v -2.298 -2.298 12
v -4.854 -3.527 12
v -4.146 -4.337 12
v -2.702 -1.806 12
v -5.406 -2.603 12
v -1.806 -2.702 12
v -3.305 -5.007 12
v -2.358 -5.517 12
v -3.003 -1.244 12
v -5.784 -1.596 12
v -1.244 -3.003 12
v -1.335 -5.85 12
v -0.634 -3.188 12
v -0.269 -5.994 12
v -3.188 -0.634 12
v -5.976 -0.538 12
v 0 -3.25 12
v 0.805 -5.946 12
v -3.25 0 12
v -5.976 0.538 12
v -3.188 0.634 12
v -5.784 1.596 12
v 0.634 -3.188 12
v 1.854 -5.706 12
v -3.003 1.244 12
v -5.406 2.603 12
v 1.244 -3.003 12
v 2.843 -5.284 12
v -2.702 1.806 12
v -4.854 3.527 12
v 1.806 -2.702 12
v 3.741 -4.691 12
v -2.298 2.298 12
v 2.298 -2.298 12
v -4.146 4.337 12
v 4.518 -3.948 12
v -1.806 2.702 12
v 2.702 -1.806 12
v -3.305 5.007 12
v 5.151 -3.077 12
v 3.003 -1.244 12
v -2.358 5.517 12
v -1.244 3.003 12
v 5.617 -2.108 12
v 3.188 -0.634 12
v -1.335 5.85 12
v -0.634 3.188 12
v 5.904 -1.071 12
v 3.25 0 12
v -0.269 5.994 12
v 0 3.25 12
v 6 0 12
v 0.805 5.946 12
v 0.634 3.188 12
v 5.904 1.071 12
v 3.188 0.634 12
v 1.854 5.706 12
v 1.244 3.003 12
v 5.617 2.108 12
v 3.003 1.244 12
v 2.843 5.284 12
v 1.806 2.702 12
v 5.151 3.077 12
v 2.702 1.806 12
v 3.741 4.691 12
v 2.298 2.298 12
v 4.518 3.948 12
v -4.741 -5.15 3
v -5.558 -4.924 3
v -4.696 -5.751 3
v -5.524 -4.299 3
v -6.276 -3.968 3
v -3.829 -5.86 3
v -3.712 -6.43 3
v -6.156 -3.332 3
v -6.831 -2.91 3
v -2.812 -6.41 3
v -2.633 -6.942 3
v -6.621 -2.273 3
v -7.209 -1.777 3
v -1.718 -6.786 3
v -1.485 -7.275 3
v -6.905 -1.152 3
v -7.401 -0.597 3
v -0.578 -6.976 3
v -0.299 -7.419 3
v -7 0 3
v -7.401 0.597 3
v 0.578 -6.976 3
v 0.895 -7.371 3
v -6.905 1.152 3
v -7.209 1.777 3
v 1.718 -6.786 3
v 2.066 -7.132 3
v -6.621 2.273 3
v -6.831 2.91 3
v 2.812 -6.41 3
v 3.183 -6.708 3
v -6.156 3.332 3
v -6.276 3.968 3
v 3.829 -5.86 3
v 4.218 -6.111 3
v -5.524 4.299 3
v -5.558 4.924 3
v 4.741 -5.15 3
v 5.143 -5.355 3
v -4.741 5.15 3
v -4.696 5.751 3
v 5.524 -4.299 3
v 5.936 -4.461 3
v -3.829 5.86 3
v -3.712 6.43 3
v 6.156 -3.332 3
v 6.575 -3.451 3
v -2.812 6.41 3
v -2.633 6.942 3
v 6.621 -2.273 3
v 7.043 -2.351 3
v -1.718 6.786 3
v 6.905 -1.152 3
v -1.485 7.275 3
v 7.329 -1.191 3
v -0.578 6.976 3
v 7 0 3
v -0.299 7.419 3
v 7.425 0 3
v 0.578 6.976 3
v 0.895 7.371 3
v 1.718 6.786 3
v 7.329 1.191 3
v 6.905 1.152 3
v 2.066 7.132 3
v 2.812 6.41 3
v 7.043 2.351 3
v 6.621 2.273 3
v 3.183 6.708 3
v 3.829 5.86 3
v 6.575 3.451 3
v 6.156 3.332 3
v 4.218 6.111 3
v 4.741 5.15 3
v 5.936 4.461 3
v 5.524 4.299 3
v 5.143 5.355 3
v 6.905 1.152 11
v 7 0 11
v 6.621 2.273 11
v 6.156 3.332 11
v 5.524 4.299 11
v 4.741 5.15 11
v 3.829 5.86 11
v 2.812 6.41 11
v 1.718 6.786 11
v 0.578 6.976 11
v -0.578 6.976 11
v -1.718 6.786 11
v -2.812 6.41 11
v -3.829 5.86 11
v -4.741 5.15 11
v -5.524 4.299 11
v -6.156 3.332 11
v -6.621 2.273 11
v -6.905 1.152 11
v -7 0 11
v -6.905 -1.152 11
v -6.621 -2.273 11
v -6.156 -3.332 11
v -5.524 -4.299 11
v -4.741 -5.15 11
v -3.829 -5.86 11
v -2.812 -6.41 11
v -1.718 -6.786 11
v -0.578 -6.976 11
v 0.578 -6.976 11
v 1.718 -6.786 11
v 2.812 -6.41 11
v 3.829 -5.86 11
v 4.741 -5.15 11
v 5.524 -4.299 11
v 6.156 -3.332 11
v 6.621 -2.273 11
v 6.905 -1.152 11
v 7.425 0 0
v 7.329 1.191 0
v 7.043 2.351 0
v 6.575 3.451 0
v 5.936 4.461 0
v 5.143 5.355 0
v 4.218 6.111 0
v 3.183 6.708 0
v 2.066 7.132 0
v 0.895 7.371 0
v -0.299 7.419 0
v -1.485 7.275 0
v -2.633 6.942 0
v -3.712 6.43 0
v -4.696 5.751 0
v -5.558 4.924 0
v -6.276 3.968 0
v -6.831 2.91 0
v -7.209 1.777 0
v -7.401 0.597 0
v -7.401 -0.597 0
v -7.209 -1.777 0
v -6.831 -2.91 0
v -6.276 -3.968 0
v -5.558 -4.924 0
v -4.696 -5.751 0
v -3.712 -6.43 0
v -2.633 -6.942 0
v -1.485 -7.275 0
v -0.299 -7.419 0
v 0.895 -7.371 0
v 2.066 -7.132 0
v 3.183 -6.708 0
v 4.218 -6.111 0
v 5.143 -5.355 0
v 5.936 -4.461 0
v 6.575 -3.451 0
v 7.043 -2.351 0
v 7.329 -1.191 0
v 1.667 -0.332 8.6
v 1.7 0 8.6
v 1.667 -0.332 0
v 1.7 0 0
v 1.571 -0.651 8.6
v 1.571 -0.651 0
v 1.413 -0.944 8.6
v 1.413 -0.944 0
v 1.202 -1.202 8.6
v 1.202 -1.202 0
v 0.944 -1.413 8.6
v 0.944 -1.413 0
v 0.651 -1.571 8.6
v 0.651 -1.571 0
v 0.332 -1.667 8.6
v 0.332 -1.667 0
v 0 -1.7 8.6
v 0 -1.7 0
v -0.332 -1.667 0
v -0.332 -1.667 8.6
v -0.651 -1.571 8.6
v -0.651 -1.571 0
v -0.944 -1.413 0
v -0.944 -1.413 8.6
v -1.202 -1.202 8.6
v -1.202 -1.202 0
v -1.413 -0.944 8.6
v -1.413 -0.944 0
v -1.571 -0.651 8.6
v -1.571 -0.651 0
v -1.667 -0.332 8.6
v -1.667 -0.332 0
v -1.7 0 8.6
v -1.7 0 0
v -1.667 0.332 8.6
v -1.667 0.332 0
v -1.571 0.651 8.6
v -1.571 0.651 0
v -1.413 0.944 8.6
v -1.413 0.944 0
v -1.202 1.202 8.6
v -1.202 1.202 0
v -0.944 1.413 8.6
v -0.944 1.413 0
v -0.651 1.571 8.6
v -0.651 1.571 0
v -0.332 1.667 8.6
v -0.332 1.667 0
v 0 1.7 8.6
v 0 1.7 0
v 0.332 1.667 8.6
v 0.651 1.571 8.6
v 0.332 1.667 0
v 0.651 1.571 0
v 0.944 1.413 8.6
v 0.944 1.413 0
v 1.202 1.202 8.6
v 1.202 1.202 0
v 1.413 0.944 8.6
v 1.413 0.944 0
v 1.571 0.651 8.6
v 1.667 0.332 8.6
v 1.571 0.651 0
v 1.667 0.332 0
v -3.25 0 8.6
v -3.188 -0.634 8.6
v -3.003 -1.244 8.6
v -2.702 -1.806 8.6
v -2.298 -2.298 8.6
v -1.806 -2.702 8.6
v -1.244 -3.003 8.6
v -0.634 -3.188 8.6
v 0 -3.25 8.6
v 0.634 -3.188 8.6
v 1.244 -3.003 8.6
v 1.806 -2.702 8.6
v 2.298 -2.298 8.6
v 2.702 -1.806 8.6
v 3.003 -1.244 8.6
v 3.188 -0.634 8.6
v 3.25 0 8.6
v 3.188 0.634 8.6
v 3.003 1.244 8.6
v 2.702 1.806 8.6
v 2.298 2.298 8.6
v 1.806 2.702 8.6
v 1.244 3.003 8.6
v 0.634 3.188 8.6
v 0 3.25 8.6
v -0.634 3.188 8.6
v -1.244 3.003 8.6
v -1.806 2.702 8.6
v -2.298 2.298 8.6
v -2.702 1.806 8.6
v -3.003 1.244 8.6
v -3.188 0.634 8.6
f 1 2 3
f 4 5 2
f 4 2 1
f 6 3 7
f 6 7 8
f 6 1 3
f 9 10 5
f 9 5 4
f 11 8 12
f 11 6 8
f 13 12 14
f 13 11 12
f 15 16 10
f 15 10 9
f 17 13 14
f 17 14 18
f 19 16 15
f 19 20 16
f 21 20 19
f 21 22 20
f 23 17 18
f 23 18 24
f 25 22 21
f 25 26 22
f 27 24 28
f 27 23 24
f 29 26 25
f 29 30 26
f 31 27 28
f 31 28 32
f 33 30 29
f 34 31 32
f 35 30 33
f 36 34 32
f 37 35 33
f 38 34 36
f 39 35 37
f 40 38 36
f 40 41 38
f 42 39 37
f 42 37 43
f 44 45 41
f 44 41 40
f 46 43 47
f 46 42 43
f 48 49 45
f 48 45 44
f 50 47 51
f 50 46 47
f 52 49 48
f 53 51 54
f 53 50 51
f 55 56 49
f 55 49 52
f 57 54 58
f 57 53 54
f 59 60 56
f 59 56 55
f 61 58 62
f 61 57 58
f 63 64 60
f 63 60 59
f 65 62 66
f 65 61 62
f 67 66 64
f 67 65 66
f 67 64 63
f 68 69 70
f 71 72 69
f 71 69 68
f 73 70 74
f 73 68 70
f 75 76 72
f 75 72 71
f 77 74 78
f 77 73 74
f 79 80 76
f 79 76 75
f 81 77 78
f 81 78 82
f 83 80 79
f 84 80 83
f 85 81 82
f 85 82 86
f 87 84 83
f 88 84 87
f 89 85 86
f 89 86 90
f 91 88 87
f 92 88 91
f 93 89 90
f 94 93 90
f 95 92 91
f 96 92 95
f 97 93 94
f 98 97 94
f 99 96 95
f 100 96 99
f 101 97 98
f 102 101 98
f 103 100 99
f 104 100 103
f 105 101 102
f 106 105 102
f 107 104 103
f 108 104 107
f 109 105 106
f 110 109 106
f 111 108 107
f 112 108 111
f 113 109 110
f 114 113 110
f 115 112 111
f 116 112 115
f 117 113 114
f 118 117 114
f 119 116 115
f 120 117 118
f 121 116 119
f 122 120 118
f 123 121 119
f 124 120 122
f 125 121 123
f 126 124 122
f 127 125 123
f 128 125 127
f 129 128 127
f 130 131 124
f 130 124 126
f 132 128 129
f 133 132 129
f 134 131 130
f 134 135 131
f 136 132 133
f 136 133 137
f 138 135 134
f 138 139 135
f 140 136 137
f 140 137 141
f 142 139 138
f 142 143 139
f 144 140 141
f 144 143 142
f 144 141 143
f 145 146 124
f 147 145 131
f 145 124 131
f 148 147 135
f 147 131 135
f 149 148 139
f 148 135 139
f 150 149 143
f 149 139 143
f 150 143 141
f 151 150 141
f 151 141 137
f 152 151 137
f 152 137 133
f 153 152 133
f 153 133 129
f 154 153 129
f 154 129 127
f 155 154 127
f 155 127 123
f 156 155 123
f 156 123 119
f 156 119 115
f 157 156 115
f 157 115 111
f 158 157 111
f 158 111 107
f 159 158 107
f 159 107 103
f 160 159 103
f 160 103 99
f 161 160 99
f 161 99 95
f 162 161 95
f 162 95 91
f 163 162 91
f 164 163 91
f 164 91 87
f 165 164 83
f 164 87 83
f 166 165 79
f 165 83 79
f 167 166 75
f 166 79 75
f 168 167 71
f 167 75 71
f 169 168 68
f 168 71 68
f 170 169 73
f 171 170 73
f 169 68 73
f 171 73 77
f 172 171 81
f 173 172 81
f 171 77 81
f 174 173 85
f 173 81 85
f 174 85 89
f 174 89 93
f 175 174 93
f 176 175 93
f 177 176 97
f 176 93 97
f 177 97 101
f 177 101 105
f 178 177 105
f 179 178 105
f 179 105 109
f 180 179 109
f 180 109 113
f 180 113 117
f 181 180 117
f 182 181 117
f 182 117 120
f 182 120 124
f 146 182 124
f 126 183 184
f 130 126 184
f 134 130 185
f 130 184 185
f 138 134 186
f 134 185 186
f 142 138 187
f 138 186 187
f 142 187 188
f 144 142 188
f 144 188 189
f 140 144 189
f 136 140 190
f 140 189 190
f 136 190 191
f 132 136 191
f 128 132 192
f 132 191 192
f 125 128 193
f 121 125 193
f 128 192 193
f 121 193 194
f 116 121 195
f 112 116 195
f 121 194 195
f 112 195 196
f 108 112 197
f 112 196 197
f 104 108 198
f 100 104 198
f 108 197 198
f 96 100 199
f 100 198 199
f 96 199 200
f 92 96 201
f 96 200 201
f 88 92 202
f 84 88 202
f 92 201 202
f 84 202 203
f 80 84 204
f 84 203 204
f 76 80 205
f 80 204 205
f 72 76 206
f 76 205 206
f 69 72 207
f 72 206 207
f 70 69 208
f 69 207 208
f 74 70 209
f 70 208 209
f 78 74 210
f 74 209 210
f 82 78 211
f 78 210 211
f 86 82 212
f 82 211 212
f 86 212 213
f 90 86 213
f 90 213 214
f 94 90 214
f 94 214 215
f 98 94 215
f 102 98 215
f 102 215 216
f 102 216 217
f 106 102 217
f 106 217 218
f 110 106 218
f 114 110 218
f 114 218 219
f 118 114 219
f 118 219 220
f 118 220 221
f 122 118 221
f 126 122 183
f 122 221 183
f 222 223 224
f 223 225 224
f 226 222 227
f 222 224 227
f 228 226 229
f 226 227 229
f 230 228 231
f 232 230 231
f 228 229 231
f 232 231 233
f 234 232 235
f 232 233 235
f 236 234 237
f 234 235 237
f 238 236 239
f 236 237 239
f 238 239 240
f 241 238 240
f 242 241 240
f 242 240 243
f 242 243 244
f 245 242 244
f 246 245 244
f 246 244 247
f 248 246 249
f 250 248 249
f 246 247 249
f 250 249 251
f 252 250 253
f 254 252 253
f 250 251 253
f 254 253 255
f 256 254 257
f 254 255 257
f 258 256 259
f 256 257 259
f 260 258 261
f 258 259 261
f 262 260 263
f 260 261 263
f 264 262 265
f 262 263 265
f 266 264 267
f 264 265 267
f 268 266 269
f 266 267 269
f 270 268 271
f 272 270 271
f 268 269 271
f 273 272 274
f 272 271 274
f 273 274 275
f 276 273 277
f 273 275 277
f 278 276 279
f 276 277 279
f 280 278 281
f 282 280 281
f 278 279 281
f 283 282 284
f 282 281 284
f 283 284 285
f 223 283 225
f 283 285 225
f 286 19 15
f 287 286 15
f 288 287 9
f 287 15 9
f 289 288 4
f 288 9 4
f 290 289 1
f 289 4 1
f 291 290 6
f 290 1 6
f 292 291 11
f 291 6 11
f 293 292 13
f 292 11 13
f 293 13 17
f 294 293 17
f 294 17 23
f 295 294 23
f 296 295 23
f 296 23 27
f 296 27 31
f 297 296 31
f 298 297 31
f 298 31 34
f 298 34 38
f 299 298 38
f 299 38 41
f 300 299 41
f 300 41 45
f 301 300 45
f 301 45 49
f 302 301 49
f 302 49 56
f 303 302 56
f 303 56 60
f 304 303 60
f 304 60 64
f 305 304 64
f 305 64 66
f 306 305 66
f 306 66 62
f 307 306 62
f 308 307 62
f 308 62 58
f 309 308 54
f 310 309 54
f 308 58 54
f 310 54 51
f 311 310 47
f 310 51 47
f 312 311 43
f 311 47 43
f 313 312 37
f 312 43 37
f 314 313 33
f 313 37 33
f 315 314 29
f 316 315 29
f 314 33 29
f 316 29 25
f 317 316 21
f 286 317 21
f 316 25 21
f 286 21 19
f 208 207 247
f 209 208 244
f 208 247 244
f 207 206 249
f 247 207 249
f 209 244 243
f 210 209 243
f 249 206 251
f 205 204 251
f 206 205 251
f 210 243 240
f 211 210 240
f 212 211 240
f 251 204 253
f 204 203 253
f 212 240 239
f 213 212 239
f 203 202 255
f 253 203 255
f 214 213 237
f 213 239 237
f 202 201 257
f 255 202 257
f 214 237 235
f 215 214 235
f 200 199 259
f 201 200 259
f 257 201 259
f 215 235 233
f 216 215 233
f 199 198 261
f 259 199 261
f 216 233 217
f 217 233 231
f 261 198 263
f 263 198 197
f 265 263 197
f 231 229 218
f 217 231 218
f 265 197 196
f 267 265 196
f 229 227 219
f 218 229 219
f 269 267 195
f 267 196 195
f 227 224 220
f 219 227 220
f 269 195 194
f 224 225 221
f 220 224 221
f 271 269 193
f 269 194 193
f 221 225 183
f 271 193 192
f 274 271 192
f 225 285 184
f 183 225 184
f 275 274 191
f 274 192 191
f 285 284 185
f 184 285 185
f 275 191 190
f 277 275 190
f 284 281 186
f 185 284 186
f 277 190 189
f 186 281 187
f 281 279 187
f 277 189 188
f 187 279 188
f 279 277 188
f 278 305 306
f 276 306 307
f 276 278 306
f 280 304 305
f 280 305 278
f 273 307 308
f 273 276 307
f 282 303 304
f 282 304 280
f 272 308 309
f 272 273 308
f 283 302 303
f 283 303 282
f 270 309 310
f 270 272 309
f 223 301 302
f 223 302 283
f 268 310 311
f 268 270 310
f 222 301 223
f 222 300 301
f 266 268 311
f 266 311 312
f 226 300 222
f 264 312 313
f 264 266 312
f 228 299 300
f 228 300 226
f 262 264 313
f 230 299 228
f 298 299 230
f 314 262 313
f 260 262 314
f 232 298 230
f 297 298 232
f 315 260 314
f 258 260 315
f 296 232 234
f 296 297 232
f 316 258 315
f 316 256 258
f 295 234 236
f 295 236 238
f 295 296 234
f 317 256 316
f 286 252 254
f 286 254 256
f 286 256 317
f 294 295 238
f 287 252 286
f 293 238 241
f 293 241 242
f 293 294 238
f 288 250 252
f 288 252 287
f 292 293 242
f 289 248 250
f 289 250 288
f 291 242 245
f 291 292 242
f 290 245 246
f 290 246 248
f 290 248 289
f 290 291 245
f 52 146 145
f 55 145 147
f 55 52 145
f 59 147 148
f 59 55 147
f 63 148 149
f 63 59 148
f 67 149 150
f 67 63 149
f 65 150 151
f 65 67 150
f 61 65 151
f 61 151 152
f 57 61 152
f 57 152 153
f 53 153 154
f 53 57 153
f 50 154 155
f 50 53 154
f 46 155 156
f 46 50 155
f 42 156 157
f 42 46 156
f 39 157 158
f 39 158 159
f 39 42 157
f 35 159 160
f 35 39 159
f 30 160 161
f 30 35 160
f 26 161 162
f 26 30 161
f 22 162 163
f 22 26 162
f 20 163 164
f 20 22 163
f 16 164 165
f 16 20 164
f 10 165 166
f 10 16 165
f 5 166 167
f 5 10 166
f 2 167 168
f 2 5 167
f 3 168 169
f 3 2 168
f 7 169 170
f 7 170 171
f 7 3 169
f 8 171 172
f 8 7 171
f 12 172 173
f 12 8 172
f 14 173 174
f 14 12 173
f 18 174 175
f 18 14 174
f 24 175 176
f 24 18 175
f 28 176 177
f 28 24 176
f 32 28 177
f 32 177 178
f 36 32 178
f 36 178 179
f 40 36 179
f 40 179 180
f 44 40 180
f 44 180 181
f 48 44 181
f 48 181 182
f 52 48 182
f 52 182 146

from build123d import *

# Parameters (mm, degrees)
SKETCH_1_R                   = 7.425
EXTRUDE_1_DEPTH              = 3
SKETCH_2_R                   = 7
EXTRUDE_2_DEPTH              = 12
HOLE_WIZARD_M3_1_D           = 3.4
HOLE_WIZARD_M3_1_CBORE_D     = 6.5
HOLE_WIZARD_M3_1_CBORE_DEPTH = 3.4
CHAMFER_1_SIZE               = 1


with BuildPart() as part:
    # 草图1 → 凸台-拉伸1 (new body)
    with BuildSketch(Plane.XY):
        Circle(SKETCH_1_R)
    extrude(amount=EXTRUDE_1_DEPTH)

    # 草图2 → 凸台-拉伸2 (add)
    with BuildSketch(Plane.XY):
        Circle(SKETCH_2_R)
    extrude(amount=EXTRUDE_2_DEPTH)

    # M3 六角凹头螺钉的柱形沉头孔1 (through all)
    with Locations(Plane(origin=(0, 0, 12), x_dir=(-1, 0, 0), z_dir=(0, 0, 1))):
        with Locations((0, 0)):
            CounterBoreHole(HOLE_WIZARD_M3_1_D / 2, HOLE_WIZARD_M3_1_CBORE_D / 2, HOLE_WIZARD_M3_1_CBORE_DEPTH)

    # 倒角1
    chamfer_1_edges = [part.edges().sort_by_distance(p)[0] for p in [
        (-7, 0, 12),
    ]]
    chamfer(chamfer_1_edges, length=CHAMFER_1_SIZE)


solid = part.part
